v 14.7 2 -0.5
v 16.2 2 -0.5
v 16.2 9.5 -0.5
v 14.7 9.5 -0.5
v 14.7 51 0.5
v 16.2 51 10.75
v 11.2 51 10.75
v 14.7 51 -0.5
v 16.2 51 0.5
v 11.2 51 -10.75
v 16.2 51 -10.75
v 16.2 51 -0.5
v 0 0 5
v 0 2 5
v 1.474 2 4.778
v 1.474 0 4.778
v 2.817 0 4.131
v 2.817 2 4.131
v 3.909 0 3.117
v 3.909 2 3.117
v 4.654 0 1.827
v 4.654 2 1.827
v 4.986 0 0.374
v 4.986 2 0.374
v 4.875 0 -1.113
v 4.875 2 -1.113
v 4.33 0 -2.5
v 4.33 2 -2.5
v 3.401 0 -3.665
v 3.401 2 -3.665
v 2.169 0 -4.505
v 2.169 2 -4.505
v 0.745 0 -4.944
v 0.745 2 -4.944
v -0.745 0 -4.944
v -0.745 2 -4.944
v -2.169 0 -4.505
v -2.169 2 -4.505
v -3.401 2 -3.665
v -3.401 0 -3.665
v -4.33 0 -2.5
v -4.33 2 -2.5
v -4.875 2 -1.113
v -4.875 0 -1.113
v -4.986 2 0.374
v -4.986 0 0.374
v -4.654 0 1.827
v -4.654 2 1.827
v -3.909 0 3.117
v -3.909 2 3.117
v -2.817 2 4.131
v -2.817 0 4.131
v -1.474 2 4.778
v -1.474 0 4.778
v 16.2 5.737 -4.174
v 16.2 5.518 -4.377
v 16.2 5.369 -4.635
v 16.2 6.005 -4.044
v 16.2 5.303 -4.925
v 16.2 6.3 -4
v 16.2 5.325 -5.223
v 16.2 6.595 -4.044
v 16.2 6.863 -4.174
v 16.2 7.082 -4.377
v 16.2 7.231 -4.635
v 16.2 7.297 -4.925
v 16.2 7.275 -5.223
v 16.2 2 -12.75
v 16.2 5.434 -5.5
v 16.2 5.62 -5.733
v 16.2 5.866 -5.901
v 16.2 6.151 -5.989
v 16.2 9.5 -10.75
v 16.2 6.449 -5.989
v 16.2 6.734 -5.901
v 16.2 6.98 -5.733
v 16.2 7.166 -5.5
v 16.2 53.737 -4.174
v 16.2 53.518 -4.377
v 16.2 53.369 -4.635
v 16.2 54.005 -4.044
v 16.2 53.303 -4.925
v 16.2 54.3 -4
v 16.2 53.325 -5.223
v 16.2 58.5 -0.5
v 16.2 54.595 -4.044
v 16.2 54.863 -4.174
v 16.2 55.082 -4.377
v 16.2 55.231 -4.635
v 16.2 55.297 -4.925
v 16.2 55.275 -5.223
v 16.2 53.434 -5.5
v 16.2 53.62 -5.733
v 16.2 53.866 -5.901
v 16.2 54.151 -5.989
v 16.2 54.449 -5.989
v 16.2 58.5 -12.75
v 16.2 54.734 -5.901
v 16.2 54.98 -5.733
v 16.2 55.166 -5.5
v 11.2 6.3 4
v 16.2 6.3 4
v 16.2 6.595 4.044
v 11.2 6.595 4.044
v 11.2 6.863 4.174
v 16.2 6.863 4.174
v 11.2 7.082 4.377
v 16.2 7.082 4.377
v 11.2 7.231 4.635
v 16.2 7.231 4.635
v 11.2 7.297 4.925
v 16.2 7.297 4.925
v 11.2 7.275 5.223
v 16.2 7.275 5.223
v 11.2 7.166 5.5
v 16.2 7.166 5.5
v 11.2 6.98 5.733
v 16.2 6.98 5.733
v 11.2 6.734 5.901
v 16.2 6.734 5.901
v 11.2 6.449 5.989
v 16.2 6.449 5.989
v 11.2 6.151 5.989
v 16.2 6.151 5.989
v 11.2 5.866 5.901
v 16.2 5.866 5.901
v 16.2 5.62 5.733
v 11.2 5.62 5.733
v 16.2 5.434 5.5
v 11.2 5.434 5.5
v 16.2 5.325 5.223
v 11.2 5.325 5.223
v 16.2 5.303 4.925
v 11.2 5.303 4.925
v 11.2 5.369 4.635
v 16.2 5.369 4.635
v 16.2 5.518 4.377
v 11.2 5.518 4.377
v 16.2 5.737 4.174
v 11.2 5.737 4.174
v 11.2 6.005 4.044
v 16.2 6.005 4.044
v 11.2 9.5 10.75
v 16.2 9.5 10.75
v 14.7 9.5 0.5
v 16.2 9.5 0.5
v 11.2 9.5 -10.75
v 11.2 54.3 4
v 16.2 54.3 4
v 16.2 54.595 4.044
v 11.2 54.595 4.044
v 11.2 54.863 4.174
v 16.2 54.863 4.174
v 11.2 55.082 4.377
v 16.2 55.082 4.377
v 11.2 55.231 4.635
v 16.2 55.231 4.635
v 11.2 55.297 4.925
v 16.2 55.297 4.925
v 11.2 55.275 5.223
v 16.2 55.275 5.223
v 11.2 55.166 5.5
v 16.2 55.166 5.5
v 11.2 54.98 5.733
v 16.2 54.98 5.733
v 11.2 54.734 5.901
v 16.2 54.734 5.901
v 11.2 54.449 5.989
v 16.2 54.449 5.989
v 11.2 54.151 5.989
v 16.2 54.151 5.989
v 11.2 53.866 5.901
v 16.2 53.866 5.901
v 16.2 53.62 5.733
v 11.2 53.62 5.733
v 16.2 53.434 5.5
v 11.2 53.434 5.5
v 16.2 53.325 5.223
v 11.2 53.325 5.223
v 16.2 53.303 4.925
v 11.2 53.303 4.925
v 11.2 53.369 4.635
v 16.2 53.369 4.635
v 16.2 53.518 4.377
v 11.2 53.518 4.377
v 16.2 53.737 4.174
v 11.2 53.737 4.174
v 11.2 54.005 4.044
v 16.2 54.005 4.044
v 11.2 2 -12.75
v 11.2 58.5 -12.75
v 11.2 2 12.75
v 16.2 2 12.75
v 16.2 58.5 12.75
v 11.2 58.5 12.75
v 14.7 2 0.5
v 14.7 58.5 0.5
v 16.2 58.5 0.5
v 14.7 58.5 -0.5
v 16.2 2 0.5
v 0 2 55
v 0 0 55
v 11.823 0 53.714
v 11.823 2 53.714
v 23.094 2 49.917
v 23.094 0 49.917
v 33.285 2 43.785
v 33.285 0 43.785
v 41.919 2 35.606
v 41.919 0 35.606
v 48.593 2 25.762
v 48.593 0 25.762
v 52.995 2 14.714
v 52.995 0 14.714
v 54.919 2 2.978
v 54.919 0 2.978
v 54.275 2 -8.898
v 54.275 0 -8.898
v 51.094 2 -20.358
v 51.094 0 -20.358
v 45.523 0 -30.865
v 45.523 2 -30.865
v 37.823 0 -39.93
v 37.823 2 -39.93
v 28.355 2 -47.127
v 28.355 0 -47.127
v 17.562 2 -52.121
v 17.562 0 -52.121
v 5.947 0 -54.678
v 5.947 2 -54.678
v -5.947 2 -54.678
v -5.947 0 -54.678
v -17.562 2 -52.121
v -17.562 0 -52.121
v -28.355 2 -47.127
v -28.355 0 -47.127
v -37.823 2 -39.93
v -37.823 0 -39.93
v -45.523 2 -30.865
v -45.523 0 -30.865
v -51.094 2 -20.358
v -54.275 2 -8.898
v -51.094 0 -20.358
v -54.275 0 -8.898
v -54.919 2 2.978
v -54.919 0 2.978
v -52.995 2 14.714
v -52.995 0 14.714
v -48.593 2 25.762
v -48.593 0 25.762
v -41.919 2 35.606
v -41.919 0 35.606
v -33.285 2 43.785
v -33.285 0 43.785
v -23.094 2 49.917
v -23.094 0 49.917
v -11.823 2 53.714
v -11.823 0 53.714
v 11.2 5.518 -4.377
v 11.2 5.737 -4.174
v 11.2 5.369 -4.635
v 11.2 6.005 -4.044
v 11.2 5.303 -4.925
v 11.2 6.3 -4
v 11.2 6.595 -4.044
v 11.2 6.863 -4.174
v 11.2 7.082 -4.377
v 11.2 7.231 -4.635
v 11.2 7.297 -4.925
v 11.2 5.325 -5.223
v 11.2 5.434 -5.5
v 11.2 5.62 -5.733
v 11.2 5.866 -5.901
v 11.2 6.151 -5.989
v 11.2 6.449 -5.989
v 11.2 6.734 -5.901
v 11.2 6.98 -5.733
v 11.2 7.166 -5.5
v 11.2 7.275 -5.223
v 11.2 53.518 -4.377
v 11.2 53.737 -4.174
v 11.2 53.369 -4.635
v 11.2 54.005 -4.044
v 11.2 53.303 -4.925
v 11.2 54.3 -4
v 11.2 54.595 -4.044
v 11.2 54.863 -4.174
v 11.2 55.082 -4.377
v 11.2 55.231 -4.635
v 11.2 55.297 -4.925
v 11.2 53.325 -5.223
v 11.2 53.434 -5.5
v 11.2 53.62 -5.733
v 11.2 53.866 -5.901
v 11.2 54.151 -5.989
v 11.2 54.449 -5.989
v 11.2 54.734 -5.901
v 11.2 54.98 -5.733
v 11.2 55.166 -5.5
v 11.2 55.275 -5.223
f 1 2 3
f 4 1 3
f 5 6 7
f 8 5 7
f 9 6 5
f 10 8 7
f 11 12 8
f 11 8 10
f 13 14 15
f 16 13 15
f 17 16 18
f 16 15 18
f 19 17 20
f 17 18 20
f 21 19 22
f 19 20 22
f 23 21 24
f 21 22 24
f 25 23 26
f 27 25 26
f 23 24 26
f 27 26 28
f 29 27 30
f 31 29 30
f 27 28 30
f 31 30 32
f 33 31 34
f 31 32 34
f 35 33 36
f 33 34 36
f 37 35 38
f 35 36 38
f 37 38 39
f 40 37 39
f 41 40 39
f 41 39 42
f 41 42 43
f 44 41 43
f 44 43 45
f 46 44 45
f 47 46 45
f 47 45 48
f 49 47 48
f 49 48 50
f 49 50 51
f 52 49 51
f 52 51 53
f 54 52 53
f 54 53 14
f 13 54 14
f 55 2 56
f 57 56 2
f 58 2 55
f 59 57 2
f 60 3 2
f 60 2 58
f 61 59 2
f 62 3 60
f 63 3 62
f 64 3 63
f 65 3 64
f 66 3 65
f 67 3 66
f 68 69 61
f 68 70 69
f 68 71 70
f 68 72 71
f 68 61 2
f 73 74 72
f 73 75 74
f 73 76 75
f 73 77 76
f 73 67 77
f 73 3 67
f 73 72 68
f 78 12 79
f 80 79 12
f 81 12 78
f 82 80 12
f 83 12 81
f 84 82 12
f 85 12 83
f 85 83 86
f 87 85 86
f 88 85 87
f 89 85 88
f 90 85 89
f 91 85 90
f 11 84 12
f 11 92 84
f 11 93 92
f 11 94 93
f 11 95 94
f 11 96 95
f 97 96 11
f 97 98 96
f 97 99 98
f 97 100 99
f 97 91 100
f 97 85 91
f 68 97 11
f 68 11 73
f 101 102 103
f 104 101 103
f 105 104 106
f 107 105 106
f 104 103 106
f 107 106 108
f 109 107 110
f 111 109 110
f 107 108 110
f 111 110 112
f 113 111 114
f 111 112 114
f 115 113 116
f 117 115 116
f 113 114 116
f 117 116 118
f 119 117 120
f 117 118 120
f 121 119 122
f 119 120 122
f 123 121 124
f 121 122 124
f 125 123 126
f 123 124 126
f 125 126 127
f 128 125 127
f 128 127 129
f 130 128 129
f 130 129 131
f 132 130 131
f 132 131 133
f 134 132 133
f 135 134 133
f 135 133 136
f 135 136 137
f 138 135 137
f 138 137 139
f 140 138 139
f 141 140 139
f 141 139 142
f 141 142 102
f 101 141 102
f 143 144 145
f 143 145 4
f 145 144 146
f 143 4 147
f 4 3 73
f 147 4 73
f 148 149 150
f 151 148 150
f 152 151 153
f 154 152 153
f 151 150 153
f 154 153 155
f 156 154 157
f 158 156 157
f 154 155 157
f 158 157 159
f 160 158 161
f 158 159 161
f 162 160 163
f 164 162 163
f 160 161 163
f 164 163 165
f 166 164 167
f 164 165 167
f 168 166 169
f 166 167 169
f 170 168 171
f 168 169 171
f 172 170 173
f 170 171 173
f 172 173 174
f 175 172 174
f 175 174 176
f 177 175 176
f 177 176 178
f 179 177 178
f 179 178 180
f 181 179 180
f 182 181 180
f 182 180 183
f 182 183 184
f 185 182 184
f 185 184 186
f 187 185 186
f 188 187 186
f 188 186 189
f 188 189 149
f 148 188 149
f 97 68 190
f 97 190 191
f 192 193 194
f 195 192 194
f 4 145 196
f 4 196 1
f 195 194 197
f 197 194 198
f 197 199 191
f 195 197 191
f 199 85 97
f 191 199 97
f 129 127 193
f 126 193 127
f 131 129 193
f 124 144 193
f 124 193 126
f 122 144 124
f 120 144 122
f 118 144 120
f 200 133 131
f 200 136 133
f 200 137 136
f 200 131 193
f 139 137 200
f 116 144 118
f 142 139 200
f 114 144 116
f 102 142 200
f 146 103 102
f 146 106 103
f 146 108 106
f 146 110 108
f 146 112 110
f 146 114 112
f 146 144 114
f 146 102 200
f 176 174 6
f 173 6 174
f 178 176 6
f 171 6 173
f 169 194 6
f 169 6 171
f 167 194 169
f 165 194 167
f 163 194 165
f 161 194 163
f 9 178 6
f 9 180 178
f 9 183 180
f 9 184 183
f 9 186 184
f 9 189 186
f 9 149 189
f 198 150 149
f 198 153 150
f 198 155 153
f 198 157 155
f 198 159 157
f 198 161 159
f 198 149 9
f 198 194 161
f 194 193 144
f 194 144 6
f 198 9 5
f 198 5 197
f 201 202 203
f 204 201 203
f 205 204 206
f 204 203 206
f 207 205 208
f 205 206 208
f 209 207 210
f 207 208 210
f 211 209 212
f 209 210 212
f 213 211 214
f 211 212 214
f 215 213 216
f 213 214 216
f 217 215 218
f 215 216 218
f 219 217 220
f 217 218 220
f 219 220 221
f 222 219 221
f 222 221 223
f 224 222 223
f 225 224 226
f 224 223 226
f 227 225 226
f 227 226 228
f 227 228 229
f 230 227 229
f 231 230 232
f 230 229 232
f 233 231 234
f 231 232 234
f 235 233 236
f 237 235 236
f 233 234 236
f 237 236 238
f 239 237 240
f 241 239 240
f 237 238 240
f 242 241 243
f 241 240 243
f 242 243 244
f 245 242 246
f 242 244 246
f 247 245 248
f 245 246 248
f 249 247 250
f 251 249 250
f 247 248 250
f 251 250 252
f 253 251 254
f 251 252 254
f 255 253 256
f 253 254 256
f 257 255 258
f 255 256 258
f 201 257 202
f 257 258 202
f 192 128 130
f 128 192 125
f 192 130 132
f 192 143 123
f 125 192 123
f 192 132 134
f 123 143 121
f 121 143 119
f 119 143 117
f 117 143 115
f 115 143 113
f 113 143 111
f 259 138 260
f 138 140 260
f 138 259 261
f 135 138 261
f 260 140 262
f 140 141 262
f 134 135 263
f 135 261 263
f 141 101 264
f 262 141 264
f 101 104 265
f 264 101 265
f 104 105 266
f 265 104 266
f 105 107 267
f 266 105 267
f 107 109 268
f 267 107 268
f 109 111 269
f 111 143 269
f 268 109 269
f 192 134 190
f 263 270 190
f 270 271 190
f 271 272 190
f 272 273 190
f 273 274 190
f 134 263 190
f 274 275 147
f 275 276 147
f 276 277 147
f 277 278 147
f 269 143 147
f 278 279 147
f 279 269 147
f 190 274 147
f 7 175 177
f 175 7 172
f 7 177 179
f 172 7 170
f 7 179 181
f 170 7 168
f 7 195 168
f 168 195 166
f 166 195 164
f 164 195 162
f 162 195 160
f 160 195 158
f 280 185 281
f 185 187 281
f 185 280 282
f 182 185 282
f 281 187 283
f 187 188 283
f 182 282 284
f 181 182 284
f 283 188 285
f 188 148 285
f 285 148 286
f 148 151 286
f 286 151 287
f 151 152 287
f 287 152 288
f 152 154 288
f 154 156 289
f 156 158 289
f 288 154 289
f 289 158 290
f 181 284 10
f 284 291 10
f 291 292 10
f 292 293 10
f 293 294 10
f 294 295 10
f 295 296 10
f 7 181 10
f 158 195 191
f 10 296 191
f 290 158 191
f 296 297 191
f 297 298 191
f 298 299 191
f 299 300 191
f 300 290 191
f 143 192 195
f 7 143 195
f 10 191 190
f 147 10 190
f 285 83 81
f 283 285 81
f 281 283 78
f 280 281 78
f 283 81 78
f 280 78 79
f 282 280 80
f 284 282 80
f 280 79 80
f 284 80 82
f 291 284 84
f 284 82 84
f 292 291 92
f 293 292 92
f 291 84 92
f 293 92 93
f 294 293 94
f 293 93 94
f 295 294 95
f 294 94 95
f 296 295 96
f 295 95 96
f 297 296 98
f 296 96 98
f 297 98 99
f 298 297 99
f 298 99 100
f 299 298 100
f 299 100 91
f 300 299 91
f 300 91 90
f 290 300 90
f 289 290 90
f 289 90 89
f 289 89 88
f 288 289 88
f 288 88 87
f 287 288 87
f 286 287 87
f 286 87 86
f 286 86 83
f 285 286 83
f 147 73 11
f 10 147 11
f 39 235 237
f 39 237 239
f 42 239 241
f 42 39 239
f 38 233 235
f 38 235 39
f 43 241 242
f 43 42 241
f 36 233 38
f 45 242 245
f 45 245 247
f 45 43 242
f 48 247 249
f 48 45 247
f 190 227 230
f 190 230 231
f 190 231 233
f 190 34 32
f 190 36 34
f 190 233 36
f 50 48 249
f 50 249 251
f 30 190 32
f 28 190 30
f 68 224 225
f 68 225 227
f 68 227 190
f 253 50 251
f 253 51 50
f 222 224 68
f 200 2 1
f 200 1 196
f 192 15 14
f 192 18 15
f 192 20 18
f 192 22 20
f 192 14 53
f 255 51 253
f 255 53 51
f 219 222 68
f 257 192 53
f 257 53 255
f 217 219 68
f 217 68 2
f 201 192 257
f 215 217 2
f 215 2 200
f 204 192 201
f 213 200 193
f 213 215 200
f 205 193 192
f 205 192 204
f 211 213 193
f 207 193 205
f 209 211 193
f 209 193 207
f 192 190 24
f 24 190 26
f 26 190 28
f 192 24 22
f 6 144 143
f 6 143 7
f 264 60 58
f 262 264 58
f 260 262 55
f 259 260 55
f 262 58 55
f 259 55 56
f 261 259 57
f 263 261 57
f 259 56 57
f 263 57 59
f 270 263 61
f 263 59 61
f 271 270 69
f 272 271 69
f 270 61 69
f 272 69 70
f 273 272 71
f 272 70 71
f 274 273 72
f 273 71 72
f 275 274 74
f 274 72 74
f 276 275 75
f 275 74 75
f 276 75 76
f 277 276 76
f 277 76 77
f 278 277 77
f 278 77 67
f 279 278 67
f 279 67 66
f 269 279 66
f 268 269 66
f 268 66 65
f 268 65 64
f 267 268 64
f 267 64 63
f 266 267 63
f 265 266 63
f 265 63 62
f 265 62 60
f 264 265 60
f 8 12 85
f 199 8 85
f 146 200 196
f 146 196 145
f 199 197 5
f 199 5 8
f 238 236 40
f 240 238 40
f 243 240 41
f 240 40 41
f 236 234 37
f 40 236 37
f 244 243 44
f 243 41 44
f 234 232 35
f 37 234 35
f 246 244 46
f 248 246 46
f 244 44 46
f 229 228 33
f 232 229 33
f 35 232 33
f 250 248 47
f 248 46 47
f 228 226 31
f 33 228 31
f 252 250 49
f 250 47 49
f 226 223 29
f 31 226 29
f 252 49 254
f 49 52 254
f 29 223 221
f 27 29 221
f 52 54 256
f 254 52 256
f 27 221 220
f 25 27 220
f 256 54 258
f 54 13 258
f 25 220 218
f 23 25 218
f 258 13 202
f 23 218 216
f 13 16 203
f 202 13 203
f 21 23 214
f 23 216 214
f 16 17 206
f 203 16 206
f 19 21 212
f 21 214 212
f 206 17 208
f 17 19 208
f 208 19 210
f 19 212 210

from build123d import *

# Parameters (mm, degrees)
SKETCH1_R           = 55
BOSS_EXTRUDE1_DEPTH = 2
SKETCH2_R           = 5
CUT_EXTRUDE1_DEPTH  = 78.807454656
SKETCH4_W           = 25.5
SKETCH4_H           = 56.5
SKETCH4_W_2         = 21.5
SKETCH4_H_2         = 41.5
BOSS_EXTRUDE2_DEPTH = 5
SKETCH5_R           = 1
CUT_EXTRUDE2_DEPTH  = 108.31584226
SKETCH6_W           = 1
SKETCH6_H           = 56.5
CUT_EXTRUDE3_DEPTH  = 1.5


with BuildPart() as part:
    # Sketch1 → Boss-Extrude1 (new body)
    with BuildSketch(Plane(origin=(0, 0, 0), x_dir=(1, 0, 0), z_dir=(0, 1, 0))):
        with Locations(Location((0, 0, 0), (0, 0, 270))):
            Circle(SKETCH1_R)
    extrude(amount=BOSS_EXTRUDE1_DEPTH)

    # Sketch2 → Cut-Extrude1 (cut, through all)
    with BuildSketch(Plane(origin=(0, 2, 0), x_dir=(1, 0, 0), z_dir=(0, 1, 0))):
        with Locations(Location((0, 0, 0), (0, 0, 270))):
            Circle(SKETCH2_R)
    extrude(amount=-CUT_EXTRUDE1_DEPTH, mode=Mode.SUBTRACT)

    # Sketch4 → Boss-Extrude2 (add)
    with BuildSketch(Plane(origin=(16.2, 0, 0), x_dir=(0, 0, -1), z_dir=(1, 0, 0))):
        with Locations((0, 30.25)):
            Rectangle(SKETCH4_W, SKETCH4_H)
        with Locations((0, 30.25)):
            Rectangle(SKETCH4_W_2, SKETCH4_H_2, mode=Mode.SUBTRACT)
    extrude(amount=-BOSS_EXTRUDE2_DEPTH)

    # Sketch5 → Cut-Extrude2 (cut, through all)
    with BuildSketch(Plane(origin=(16.2, 0, 0), x_dir=(0, 0, -1), z_dir=(1, 0, 0))):
        with Locations((-5, 54.3)):
            Circle(SKETCH5_R)
        with Locations((-5, 6.3)):
            Circle(SKETCH5_R)
        with Locations(Location((5, 6.3, 0), (0, 0, 180))):
            Circle(SKETCH5_R)
        with Locations(Location((5, 54.3, 0), (0, 0, 180))):
            Circle(SKETCH5_R)
    extrude(amount=-CUT_EXTRUDE2_DEPTH, mode=Mode.SUBTRACT)

    # Sketch6 → Cut-Extrude3 (cut)
    with BuildSketch(Plane(origin=(16.2, 0, 0), x_dir=(0, 0, -1), z_dir=(1, 0, 0))):
        with Locations((0, 30.25)):
            Rectangle(SKETCH6_W, SKETCH6_H)
    extrude(amount=-CUT_EXTRUDE3_DEPTH, mode=Mode.SUBTRACT)


solid = part.part
